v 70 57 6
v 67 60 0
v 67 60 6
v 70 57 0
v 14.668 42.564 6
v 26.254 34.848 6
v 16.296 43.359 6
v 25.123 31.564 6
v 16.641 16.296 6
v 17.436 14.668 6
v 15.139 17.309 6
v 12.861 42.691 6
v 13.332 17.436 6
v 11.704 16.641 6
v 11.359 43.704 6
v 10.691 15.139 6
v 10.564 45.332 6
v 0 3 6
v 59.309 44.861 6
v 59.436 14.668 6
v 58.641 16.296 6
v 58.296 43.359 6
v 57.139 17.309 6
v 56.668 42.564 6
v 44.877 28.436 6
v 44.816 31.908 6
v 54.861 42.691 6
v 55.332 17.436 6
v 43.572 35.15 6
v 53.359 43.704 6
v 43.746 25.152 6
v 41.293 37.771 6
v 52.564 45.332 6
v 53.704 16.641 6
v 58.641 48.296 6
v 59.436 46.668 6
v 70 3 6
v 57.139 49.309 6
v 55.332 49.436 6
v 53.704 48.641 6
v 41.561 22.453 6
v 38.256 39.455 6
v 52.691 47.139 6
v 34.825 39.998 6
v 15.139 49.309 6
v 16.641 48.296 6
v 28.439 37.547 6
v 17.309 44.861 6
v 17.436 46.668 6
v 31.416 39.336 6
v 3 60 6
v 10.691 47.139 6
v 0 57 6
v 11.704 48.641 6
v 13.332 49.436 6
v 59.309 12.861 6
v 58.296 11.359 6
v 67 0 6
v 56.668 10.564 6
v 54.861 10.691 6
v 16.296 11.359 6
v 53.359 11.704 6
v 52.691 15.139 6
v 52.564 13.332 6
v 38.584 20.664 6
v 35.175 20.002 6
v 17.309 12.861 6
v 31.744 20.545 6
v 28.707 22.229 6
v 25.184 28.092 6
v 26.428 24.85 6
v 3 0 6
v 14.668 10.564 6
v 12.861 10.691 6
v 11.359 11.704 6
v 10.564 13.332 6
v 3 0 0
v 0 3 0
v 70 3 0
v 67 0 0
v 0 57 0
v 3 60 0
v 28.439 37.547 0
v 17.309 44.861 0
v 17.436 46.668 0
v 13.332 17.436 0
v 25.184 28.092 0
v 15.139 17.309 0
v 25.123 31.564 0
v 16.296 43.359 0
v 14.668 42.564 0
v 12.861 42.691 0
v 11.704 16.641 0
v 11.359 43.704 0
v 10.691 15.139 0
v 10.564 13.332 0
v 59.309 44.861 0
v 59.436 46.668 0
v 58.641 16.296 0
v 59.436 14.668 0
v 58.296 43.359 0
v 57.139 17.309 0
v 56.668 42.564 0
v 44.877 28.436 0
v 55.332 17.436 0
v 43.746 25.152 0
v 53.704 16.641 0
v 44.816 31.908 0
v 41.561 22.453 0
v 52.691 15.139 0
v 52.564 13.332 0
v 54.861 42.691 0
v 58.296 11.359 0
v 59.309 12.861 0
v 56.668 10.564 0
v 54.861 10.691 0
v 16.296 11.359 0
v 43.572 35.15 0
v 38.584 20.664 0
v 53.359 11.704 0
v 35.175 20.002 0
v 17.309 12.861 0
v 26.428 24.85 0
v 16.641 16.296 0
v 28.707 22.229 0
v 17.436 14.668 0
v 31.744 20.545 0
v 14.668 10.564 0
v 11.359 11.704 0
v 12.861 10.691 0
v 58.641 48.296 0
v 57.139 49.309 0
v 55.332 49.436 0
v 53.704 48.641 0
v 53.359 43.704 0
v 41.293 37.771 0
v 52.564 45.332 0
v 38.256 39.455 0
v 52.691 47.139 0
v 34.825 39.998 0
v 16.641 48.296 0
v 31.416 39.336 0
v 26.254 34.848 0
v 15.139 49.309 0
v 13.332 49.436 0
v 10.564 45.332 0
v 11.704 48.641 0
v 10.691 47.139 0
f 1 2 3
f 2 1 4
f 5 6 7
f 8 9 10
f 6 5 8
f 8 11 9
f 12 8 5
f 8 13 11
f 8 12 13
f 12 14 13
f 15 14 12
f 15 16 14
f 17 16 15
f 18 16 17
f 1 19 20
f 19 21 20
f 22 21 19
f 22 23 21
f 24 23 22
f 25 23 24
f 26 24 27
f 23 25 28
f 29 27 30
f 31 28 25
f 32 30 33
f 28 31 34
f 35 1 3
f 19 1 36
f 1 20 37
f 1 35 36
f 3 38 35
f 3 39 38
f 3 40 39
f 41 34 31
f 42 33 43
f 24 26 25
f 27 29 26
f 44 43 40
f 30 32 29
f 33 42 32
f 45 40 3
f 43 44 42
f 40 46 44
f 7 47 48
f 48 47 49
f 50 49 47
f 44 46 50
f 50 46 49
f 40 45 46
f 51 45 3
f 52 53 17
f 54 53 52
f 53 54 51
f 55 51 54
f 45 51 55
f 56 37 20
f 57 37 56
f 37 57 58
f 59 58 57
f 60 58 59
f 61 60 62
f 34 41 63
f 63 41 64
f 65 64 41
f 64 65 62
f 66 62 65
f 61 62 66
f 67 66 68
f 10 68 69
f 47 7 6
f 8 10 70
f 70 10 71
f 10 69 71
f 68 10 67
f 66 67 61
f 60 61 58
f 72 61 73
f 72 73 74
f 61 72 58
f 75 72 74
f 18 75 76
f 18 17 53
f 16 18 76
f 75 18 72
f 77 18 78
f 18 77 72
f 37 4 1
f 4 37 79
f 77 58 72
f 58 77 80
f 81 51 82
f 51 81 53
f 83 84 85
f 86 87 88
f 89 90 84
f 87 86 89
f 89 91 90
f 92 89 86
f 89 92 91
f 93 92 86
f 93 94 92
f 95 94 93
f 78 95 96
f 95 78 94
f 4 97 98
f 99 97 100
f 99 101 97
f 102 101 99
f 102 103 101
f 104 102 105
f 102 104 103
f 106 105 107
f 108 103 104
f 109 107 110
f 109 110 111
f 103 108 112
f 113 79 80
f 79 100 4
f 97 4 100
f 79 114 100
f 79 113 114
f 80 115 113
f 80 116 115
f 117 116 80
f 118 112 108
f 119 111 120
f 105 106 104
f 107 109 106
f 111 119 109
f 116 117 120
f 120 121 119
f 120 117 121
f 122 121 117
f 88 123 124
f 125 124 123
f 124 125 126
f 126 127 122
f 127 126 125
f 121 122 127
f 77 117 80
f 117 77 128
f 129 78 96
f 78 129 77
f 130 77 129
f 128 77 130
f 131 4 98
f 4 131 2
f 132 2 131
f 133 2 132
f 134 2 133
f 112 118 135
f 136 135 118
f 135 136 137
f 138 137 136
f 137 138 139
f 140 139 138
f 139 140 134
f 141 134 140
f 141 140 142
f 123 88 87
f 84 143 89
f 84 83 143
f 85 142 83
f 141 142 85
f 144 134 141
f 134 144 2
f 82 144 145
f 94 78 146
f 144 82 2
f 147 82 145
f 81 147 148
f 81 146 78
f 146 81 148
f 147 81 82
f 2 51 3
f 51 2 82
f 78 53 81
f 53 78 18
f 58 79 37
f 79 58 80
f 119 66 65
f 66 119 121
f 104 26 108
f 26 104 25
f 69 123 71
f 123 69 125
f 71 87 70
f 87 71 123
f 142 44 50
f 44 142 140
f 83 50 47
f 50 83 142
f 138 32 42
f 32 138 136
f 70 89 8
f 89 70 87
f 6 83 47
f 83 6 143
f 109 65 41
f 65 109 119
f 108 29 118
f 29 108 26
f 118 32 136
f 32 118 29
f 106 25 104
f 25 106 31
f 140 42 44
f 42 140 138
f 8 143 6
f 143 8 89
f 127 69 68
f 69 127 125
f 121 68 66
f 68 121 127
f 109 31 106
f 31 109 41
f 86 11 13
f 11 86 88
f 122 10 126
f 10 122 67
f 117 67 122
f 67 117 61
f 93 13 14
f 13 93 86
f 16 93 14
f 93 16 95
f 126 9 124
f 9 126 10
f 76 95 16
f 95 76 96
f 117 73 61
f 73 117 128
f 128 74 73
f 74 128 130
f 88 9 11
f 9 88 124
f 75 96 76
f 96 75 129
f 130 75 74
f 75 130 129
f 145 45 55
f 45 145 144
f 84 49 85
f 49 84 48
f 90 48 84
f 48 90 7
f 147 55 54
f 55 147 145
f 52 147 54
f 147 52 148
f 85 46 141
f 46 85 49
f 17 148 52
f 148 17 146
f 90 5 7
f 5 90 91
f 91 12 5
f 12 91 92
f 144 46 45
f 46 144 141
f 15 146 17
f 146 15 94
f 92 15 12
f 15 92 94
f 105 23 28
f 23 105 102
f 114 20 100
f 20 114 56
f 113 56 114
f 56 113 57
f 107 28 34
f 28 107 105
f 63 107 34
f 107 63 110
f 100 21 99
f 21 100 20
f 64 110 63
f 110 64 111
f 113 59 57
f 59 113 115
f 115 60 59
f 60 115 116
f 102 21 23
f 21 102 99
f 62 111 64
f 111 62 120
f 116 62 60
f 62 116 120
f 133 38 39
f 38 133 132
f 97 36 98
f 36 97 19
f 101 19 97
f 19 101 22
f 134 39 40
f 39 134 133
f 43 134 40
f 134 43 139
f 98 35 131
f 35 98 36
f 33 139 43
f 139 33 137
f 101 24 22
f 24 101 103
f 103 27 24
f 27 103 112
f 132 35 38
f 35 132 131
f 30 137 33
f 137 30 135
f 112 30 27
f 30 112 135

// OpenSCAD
$fn = 32;

// ----------------------------------------------------------------------
// Spacer plate: rect 70 x 60
// ----------------------------------------------------------------------

// --- parameters (mm) ---
bore_r = 10;              // centre bore radius
bolt_r = 3.5;             // bolt hole radius
plate_t = 6;              // plate thickness, Z (extrusion height)
plate_l = 70;             // plate length, X
plate_w = 60;             // plate width, Y
inset = 14;               // corner hole inset

profile = [[3, 0], [67, 0], [70, 3], [70, 57], [67, 60], [3, 60], [0, 57], [0, 3]];  // primary outline, 8 points, counter clockwise
void_1 = [[44.816, 31.908], [43.572, 35.15], [41.293, 37.771], [38.256, 39.455], [34.825, 39.998], [31.416, 39.336], [28.439, 37.547], [26.254, 34.848], [25.123, 31.564], [25.184, 28.092], [26.428, 24.85], [28.707, 22.229], [31.744, 20.545], [35.175, 20.002], [38.584, 20.664], [41.561, 22.453], [43.746, 25.152], [44.877, 28.436]];  // centre bore, 18 points
void_2 = [[17.436, 14.668], [16.641, 16.296], [15.139, 17.309], [13.332, 17.436], [11.704, 16.641], [10.691, 15.139], [10.564, 13.332], [11.359, 11.704], [12.861, 10.691], [14.668, 10.564], [16.296, 11.359], [17.309, 12.861]];  // corner hole, 12 points
void_3 = [[17.436, 46.668], [16.641, 48.296], [15.139, 49.309], [13.332, 49.436], [11.704, 48.641], [10.691, 47.139], [10.564, 45.332], [11.359, 43.704], [12.861, 42.691], [14.668, 42.564], [16.296, 43.359], [17.309, 44.861]];  // corner hole, 12 points
void_4 = [[59.436, 14.668], [58.641, 16.296], [57.139, 17.309], [55.332, 17.436], [53.704, 16.641], [52.691, 15.139], [52.564, 13.332], [53.359, 11.704], [54.861, 10.691], [56.668, 10.564], [58.296, 11.359], [59.309, 12.861]];  // corner hole, 12 points
void_5 = [[59.436, 46.668], [58.641, 48.296], [57.139, 49.309], [55.332, 49.436], [53.704, 48.641], [52.691, 47.139], [52.564, 45.332], [53.359, 43.704], [54.861, 42.691], [56.668, 42.564], [58.296, 43.359], [59.309, 44.861]];  // corner hole, 12 points

// --- the one profile operation ---
difference() {
  linear_extrude(height = plate_t) polygon(points = profile);
  translate([0, 0, -1])
    linear_extrude(height = plate_t + 2) polygon(points = void_1);
  translate([0, 0, -1])
    linear_extrude(height = plate_t + 2) polygon(points = void_2);
  translate([0, 0, -1])
    linear_extrude(height = plate_t + 2) polygon(points = void_3);
  translate([0, 0, -1])
    linear_extrude(height = plate_t + 2) polygon(points = void_4);
  translate([0, 0, -1])
    linear_extrude(height = plate_t + 2) polygon(points = void_5);
}
